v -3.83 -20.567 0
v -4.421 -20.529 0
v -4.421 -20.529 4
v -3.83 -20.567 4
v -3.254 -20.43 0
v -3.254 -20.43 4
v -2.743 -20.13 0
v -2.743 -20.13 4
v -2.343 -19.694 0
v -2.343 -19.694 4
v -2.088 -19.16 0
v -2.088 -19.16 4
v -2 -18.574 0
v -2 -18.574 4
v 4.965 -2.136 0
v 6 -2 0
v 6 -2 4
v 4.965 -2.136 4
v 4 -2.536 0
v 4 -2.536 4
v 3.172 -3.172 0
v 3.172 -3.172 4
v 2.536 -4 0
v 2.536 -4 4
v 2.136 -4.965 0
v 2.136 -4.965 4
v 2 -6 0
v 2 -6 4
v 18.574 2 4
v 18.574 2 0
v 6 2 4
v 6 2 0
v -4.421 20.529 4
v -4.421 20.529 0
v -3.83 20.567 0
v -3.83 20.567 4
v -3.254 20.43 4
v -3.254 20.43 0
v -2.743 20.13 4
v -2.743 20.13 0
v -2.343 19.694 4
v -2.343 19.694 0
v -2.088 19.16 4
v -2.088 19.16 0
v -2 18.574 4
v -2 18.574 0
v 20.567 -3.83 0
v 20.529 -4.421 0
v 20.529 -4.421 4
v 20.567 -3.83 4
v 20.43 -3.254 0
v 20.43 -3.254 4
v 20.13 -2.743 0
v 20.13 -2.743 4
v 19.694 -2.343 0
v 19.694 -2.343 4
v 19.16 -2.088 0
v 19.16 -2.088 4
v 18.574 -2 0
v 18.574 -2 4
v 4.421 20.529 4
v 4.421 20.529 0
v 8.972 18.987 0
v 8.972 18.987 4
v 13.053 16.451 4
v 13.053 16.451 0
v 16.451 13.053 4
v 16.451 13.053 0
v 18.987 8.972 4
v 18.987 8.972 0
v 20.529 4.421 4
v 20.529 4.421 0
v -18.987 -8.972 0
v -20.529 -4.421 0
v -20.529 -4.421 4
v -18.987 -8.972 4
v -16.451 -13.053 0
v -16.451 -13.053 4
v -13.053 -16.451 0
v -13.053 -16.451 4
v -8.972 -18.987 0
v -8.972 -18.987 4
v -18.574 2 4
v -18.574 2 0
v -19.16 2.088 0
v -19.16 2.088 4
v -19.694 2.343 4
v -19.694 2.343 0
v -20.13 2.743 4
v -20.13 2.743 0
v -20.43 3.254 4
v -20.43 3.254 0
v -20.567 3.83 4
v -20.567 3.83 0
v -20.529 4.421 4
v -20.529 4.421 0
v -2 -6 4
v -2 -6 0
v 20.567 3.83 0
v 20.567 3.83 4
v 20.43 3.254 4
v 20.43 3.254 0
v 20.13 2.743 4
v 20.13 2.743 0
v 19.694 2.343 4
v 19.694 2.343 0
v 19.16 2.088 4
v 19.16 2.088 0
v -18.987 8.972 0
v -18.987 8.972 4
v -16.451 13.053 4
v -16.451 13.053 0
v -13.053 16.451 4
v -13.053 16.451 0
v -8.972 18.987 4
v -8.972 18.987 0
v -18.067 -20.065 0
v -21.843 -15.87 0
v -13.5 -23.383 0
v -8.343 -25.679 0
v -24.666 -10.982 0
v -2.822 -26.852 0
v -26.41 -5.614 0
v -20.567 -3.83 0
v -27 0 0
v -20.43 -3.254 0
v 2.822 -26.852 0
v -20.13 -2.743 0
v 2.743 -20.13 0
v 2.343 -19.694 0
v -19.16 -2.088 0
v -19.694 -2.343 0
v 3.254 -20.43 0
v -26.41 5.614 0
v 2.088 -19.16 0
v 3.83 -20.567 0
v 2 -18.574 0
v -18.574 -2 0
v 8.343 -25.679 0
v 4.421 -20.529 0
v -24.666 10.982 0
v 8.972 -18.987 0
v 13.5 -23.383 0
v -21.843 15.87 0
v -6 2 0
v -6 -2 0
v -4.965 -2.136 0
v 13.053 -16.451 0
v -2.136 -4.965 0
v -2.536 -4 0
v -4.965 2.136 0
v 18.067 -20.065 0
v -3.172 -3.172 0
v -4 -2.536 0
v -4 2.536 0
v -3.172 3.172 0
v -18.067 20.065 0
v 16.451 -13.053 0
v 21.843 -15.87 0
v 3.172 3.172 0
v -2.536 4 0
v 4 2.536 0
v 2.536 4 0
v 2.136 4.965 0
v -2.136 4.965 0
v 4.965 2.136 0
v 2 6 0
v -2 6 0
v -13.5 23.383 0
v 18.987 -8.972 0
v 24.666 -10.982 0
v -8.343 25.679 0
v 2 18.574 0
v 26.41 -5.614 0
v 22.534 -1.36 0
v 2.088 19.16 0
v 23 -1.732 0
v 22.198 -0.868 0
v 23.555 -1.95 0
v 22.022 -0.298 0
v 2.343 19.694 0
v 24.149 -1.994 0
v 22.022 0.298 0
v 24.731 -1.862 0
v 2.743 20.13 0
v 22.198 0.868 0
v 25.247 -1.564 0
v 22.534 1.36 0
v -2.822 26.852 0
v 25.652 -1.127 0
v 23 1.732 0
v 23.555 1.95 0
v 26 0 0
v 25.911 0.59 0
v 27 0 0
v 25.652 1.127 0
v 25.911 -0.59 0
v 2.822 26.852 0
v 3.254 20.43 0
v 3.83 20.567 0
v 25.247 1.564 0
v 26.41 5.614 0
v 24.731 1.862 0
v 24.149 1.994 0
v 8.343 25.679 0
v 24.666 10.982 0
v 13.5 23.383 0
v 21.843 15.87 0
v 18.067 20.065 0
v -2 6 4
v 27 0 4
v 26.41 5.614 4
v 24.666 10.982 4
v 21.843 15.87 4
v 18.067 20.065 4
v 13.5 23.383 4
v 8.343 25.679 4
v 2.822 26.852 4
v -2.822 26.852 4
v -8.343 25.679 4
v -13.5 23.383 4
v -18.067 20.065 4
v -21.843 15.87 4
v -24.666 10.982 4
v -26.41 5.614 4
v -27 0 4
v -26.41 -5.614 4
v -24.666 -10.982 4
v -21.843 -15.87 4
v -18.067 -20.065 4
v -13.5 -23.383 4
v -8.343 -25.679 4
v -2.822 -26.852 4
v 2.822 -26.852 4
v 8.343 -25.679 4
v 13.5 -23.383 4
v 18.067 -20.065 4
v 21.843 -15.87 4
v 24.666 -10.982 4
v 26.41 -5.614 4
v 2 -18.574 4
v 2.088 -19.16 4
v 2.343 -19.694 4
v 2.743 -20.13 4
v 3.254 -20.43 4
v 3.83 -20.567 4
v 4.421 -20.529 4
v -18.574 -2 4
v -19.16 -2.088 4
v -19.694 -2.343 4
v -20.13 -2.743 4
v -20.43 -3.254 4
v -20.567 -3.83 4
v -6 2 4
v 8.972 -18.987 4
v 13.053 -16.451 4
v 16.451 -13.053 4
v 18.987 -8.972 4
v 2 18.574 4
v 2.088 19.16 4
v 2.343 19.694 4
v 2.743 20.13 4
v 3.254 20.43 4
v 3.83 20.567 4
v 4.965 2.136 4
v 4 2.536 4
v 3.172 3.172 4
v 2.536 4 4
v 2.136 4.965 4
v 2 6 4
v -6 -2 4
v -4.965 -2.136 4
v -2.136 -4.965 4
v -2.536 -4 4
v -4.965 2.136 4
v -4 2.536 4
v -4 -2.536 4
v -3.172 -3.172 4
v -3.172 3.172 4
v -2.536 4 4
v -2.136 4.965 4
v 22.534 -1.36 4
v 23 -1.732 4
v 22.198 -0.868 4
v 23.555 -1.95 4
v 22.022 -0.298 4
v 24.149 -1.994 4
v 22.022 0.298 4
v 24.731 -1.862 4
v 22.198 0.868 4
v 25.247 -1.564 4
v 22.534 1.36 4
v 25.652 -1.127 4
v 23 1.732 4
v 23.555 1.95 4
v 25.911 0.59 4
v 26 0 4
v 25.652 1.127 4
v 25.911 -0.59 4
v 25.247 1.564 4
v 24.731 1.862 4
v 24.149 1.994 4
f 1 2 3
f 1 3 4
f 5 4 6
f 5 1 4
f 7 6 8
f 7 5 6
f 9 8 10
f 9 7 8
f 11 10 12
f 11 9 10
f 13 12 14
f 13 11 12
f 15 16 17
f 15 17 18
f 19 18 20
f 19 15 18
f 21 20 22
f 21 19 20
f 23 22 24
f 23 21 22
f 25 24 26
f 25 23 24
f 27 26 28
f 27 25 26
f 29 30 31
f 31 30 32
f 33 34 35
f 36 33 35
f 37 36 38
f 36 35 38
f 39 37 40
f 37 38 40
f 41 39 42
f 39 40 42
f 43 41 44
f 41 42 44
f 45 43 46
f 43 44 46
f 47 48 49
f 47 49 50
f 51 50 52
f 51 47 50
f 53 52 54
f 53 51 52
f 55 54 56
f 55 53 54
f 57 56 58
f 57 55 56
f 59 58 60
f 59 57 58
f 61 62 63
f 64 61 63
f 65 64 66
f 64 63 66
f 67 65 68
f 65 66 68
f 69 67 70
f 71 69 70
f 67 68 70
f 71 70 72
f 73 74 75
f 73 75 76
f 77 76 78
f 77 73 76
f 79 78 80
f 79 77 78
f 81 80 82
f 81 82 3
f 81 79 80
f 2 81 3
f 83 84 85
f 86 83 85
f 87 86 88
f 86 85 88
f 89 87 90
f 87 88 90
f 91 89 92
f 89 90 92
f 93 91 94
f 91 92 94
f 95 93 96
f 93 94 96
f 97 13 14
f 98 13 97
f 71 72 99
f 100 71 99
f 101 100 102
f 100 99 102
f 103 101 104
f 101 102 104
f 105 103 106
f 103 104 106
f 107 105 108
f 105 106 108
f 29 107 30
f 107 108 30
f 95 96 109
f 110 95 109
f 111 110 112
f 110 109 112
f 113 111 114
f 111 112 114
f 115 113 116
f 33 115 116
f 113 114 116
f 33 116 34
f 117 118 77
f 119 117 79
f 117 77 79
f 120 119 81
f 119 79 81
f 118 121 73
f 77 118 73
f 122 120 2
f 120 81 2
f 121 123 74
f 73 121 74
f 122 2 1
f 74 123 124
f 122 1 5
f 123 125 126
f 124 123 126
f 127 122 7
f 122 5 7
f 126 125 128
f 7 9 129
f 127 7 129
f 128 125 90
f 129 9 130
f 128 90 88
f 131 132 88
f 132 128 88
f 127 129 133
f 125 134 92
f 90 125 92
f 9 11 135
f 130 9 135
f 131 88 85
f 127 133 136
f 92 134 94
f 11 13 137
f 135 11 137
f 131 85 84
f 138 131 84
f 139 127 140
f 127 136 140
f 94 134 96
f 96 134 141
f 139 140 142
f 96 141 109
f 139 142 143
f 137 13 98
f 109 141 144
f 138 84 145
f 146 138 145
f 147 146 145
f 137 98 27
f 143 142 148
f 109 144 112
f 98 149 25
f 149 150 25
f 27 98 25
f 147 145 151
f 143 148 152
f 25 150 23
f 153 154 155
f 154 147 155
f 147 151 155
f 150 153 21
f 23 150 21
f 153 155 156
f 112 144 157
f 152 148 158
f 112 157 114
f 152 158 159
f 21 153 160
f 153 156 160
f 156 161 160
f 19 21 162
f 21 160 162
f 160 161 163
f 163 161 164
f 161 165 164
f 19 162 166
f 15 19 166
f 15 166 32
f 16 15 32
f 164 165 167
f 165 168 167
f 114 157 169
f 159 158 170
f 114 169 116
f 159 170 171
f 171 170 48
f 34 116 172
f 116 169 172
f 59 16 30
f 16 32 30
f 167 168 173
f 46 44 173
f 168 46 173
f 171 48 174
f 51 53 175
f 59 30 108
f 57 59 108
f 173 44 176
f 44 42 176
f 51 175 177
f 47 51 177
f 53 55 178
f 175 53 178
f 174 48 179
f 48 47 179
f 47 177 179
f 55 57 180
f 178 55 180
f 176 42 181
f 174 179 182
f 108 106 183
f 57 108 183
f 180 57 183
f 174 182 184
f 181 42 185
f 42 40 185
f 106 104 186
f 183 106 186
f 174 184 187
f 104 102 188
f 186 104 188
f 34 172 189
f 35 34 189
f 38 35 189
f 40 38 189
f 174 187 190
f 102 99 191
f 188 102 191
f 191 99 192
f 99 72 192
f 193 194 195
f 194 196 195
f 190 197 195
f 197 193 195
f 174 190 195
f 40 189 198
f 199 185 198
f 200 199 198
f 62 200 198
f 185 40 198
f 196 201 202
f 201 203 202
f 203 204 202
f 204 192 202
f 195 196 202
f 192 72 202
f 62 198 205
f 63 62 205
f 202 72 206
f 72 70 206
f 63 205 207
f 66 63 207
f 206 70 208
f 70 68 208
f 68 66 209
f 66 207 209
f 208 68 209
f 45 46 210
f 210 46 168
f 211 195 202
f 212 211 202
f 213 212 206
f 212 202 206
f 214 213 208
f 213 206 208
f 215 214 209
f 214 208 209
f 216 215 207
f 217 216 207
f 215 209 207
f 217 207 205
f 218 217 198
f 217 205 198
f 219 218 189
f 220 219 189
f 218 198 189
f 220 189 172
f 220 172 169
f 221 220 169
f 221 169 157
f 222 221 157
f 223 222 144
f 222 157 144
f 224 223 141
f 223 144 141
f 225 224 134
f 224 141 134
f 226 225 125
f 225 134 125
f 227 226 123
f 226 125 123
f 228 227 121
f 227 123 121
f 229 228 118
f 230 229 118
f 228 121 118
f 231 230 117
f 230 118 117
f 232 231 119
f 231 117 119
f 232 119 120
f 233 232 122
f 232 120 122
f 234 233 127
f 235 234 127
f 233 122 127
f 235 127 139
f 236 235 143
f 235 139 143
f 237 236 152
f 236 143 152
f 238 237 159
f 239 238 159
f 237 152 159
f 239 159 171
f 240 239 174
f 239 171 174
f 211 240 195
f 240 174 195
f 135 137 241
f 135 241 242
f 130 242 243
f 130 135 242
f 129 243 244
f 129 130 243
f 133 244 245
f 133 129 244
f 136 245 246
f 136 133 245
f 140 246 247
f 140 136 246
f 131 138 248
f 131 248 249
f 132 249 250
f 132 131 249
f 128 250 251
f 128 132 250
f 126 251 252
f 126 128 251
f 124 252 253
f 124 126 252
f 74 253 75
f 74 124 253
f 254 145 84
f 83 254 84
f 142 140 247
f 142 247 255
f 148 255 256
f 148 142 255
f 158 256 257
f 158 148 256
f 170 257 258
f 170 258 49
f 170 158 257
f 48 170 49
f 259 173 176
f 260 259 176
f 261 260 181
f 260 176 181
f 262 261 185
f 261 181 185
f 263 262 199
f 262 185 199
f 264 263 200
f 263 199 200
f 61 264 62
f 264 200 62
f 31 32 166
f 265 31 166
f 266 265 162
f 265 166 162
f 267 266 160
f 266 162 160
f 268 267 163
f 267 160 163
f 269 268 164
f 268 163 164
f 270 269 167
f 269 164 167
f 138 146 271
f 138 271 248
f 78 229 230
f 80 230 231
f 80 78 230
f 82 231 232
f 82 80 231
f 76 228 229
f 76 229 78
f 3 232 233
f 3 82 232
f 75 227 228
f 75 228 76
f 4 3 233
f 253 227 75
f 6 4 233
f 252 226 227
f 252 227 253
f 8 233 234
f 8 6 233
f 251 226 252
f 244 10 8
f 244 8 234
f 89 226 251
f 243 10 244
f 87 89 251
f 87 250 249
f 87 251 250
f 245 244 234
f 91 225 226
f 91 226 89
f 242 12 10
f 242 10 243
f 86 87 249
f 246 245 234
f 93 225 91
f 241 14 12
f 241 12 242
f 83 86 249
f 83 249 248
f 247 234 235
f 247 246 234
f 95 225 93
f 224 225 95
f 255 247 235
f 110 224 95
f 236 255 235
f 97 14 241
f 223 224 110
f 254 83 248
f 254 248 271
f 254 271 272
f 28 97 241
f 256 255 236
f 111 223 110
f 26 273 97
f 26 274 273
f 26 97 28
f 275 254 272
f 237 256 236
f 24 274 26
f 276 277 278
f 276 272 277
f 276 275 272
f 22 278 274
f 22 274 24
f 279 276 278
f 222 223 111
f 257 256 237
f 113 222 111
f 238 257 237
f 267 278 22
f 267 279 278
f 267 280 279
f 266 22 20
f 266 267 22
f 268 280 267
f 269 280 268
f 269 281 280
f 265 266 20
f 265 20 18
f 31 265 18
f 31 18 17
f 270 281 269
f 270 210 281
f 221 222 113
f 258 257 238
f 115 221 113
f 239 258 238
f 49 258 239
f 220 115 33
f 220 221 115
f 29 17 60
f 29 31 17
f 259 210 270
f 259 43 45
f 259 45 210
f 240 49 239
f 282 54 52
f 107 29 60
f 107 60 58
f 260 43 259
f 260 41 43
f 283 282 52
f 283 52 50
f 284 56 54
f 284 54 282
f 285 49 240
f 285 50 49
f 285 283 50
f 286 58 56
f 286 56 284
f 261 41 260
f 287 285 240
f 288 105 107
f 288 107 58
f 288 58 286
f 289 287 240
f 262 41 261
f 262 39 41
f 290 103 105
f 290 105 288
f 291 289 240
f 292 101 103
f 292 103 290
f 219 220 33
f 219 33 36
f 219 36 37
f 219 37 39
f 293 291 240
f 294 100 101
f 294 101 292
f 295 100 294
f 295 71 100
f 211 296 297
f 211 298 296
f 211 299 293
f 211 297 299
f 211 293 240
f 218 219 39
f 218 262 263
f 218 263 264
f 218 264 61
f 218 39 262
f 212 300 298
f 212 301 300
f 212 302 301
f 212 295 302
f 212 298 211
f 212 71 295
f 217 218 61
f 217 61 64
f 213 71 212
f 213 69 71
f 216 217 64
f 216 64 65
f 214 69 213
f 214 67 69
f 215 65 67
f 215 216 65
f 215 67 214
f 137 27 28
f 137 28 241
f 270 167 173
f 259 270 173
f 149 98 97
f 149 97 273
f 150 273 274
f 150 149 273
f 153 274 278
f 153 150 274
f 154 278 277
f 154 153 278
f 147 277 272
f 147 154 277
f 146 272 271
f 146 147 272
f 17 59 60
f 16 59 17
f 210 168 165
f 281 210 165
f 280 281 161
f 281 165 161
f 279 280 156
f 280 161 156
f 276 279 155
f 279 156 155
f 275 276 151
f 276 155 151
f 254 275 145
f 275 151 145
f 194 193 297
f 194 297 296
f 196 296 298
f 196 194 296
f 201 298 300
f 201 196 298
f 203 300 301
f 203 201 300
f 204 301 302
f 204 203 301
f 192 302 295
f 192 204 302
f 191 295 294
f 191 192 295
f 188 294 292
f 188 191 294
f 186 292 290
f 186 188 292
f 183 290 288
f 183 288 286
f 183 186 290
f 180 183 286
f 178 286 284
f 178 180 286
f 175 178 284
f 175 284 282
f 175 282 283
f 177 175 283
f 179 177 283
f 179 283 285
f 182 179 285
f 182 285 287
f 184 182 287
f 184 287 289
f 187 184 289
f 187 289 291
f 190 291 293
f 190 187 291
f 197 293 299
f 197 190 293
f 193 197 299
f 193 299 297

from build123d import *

# Parameters (mm, degrees)
SKETCH2_R           = 27
SKETCH2_R_2         = 2
BOSS_EXTRUDE1_DEPTH = 4


with BuildPart() as part:
    # Sketch2 → Boss-Extrude1 (new body)
    with BuildSketch(Plane.XY):
        Circle(SKETCH2_R)
        with Locations((24, 0)):
            Circle(SKETCH2_R_2, mode=Mode.SUBTRACT)
        with BuildLine():
            Line((-2, 18.574175621), (-2, 6))
            ThreePointArc((-2, 6), (-3.171572875, 3.171572875), (-6, 2))
            Line((-6, 2), (-18.574175621, 2))
            ThreePointArc((-18.574175621, 2), (-20.130148831, 2.743438275), (-20.529352002, 4.421052632))
            ThreePointArc((-20.529352002, 4.421052632), (-14.849242405, 14.849242405), (-4.421052632, 20.529352002))
            ThreePointArc((-4.421052632, 20.529352002), (-2.743438275, 20.130148831), (-2, 18.574175621))
        make_face(mode=Mode.SUBTRACT)
        with BuildLine():
            Line((18.574175621, 2), (6, 2))
            ThreePointArc((6, 2), (3.171572875, 3.171572875), (2, 6))
            Line((2, 6), (2, 18.574175621))
            ThreePointArc((2, 18.574175621), (2.743438275, 20.130148831), (4.421052632, 20.529352002))
            ThreePointArc((4.421052632, 20.529352002), (14.849242405, 14.849242405), (20.529352002, 4.421052632))
            ThreePointArc((20.529352002, 4.421052632), (20.130148831, 2.743438275), (18.574175621, 2))
        make_face(mode=Mode.SUBTRACT)
        with BuildLine():
            Line((18.574175621, -2), (6, -2))
            ThreePointArc((6, -2), (3.171572875, -3.171572875), (2, -6))
            Line((2, -6), (2, -18.574175621))
            ThreePointArc((2, -18.574175621), (2.743438275, -20.130148831), (4.421052632, -20.529352002))
            ThreePointArc((4.421052632, -20.529352002), (14.849242405, -14.849242405), (20.529352002, -4.421052632))
            ThreePointArc((20.529352002, -4.421052632), (20.130148831, -2.743438275), (18.574175621, -2))
        make_face(mode=Mode.SUBTRACT)
        with BuildLine():
            Line((-6, -2), (-18.574175621, -2))
            ThreePointArc((-18.574175621, -2), (-20.130148831, -2.743438275), (-20.529352002, -4.421052632))
            ThreePointArc((-20.529352002, -4.421052632), (-14.849242405, -14.849242405), (-4.421052632, -20.529352002))
            ThreePointArc((-4.421052632, -20.529352002), (-2.743438275, -20.130148831), (-2, -18.574175621))
            Line((-2, -18.574175621), (-2, -6))
            ThreePointArc((-2, -6), (-3.171572875, -3.171572875), (-6, -2))
        make_face(mode=Mode.SUBTRACT)
    extrude(amount=BOSS_EXTRUDE1_DEPTH)


solid = part.part
